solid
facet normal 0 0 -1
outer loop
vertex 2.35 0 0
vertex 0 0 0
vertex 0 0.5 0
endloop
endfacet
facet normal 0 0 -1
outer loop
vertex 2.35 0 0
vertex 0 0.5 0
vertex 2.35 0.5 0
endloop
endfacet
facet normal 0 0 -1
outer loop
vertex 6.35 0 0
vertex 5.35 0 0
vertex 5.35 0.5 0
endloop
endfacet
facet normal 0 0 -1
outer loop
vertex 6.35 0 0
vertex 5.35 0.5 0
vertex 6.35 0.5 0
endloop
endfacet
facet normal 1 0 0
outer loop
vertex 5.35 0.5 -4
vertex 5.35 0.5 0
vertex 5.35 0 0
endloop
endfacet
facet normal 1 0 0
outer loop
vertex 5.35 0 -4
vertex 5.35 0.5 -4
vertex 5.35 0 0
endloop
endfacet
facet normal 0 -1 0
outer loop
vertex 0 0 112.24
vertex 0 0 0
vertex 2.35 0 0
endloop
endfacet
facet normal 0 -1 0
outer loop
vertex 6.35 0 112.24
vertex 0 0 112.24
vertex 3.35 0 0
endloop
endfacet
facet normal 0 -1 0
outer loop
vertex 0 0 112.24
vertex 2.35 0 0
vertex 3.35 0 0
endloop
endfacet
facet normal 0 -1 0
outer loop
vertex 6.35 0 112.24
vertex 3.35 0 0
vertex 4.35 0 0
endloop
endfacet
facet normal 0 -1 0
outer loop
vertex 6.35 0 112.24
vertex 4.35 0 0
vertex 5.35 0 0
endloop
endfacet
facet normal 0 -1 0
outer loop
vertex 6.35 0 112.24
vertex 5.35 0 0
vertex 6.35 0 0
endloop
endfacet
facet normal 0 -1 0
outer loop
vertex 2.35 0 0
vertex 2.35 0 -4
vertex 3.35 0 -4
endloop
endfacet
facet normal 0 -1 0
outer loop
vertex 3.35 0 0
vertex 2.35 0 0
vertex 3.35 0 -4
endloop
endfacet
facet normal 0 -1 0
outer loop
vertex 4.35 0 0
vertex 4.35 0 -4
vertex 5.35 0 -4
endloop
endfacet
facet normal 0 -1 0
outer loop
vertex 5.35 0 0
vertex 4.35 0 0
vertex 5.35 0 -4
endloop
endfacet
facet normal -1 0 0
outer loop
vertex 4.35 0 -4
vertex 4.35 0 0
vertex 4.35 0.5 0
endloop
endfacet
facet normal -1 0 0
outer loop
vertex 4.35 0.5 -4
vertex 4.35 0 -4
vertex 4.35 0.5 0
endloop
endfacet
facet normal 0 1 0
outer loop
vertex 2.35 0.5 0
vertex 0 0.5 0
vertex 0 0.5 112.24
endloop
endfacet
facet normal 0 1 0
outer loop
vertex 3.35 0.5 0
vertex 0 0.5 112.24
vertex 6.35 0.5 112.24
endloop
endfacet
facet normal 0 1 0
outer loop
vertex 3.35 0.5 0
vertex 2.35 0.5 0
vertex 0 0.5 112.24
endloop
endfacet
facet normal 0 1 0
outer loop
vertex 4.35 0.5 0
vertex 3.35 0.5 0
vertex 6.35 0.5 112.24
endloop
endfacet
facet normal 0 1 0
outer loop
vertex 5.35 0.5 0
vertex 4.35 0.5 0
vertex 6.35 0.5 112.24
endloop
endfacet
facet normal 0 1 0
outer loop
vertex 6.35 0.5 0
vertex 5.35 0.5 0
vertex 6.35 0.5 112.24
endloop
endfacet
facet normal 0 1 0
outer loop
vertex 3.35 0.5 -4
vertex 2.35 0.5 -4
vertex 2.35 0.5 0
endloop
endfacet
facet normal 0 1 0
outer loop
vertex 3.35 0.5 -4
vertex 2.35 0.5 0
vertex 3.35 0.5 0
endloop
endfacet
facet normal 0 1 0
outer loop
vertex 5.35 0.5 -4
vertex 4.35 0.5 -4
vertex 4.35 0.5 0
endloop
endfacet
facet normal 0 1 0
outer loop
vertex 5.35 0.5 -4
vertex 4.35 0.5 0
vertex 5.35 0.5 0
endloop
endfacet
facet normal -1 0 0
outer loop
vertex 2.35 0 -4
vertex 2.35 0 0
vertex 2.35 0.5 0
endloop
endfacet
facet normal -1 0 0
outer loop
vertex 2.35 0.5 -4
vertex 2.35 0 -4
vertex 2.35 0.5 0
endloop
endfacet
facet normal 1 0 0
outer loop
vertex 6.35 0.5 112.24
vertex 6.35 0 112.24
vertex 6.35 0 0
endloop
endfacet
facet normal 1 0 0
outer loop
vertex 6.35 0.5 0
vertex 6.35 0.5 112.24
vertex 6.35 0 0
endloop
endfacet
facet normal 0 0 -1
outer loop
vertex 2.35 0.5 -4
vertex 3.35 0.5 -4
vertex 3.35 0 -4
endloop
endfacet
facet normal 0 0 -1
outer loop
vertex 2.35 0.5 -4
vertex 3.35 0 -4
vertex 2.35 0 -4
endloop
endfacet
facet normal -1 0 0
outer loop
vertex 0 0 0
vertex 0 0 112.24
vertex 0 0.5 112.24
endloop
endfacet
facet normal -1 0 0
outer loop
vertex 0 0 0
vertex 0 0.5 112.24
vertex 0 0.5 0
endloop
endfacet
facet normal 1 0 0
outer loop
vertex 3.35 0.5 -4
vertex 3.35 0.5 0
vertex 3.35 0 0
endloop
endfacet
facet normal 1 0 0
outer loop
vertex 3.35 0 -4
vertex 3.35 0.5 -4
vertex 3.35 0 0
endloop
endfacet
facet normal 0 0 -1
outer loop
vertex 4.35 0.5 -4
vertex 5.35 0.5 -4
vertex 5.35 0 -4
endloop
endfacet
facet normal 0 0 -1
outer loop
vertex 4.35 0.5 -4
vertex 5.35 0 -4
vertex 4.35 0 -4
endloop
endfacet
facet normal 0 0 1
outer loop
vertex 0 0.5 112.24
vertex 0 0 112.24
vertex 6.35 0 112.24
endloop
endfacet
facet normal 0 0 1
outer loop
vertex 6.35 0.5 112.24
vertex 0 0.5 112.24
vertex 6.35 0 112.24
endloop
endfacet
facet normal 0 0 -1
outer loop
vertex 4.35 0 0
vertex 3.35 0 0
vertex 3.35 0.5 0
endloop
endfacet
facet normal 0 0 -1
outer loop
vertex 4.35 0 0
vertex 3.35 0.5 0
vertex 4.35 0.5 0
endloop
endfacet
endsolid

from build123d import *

# Parameters (mm, degrees)
SKETCH1_W           = 6.35
SKETCH1_H           = 112.24
BOSS_EXTRUDE1_DEPTH = 0.5
BOSS_EXTRUDE2_DEPTH = 4


with BuildPart() as part:
    # Sketch1 → Boss-Extrude1 (new body)
    with BuildSketch(Plane(origin=(0, 0, 0), x_dir=(1, 0, 0), z_dir=(0, 1, 0))):
        with Locations((3.175, -56.12)):
            Rectangle(SKETCH1_W, SKETCH1_H)
    extrude(amount=BOSS_EXTRUDE1_DEPTH)

    # Sketch2 → Boss-Extrude2 (add)
    with BuildSketch(Plane(origin=(0, 0, 0), x_dir=(-1, 0, 0), z_dir=(0, 0, -1))):
        Polygon((-2.35, 0.5), (-3.35, 0.5), (-3.35, 0.25), (-3.35, 0), (-2.35, 0), align=None)
        Polygon((-4.35, 0.5), (-5.35, 0.5), (-5.35, 0), (-4.35, 0), (-4.35, 0.25), align=None)
    extrude(amount=BOSS_EXTRUDE2_DEPTH)


solid = part.part
